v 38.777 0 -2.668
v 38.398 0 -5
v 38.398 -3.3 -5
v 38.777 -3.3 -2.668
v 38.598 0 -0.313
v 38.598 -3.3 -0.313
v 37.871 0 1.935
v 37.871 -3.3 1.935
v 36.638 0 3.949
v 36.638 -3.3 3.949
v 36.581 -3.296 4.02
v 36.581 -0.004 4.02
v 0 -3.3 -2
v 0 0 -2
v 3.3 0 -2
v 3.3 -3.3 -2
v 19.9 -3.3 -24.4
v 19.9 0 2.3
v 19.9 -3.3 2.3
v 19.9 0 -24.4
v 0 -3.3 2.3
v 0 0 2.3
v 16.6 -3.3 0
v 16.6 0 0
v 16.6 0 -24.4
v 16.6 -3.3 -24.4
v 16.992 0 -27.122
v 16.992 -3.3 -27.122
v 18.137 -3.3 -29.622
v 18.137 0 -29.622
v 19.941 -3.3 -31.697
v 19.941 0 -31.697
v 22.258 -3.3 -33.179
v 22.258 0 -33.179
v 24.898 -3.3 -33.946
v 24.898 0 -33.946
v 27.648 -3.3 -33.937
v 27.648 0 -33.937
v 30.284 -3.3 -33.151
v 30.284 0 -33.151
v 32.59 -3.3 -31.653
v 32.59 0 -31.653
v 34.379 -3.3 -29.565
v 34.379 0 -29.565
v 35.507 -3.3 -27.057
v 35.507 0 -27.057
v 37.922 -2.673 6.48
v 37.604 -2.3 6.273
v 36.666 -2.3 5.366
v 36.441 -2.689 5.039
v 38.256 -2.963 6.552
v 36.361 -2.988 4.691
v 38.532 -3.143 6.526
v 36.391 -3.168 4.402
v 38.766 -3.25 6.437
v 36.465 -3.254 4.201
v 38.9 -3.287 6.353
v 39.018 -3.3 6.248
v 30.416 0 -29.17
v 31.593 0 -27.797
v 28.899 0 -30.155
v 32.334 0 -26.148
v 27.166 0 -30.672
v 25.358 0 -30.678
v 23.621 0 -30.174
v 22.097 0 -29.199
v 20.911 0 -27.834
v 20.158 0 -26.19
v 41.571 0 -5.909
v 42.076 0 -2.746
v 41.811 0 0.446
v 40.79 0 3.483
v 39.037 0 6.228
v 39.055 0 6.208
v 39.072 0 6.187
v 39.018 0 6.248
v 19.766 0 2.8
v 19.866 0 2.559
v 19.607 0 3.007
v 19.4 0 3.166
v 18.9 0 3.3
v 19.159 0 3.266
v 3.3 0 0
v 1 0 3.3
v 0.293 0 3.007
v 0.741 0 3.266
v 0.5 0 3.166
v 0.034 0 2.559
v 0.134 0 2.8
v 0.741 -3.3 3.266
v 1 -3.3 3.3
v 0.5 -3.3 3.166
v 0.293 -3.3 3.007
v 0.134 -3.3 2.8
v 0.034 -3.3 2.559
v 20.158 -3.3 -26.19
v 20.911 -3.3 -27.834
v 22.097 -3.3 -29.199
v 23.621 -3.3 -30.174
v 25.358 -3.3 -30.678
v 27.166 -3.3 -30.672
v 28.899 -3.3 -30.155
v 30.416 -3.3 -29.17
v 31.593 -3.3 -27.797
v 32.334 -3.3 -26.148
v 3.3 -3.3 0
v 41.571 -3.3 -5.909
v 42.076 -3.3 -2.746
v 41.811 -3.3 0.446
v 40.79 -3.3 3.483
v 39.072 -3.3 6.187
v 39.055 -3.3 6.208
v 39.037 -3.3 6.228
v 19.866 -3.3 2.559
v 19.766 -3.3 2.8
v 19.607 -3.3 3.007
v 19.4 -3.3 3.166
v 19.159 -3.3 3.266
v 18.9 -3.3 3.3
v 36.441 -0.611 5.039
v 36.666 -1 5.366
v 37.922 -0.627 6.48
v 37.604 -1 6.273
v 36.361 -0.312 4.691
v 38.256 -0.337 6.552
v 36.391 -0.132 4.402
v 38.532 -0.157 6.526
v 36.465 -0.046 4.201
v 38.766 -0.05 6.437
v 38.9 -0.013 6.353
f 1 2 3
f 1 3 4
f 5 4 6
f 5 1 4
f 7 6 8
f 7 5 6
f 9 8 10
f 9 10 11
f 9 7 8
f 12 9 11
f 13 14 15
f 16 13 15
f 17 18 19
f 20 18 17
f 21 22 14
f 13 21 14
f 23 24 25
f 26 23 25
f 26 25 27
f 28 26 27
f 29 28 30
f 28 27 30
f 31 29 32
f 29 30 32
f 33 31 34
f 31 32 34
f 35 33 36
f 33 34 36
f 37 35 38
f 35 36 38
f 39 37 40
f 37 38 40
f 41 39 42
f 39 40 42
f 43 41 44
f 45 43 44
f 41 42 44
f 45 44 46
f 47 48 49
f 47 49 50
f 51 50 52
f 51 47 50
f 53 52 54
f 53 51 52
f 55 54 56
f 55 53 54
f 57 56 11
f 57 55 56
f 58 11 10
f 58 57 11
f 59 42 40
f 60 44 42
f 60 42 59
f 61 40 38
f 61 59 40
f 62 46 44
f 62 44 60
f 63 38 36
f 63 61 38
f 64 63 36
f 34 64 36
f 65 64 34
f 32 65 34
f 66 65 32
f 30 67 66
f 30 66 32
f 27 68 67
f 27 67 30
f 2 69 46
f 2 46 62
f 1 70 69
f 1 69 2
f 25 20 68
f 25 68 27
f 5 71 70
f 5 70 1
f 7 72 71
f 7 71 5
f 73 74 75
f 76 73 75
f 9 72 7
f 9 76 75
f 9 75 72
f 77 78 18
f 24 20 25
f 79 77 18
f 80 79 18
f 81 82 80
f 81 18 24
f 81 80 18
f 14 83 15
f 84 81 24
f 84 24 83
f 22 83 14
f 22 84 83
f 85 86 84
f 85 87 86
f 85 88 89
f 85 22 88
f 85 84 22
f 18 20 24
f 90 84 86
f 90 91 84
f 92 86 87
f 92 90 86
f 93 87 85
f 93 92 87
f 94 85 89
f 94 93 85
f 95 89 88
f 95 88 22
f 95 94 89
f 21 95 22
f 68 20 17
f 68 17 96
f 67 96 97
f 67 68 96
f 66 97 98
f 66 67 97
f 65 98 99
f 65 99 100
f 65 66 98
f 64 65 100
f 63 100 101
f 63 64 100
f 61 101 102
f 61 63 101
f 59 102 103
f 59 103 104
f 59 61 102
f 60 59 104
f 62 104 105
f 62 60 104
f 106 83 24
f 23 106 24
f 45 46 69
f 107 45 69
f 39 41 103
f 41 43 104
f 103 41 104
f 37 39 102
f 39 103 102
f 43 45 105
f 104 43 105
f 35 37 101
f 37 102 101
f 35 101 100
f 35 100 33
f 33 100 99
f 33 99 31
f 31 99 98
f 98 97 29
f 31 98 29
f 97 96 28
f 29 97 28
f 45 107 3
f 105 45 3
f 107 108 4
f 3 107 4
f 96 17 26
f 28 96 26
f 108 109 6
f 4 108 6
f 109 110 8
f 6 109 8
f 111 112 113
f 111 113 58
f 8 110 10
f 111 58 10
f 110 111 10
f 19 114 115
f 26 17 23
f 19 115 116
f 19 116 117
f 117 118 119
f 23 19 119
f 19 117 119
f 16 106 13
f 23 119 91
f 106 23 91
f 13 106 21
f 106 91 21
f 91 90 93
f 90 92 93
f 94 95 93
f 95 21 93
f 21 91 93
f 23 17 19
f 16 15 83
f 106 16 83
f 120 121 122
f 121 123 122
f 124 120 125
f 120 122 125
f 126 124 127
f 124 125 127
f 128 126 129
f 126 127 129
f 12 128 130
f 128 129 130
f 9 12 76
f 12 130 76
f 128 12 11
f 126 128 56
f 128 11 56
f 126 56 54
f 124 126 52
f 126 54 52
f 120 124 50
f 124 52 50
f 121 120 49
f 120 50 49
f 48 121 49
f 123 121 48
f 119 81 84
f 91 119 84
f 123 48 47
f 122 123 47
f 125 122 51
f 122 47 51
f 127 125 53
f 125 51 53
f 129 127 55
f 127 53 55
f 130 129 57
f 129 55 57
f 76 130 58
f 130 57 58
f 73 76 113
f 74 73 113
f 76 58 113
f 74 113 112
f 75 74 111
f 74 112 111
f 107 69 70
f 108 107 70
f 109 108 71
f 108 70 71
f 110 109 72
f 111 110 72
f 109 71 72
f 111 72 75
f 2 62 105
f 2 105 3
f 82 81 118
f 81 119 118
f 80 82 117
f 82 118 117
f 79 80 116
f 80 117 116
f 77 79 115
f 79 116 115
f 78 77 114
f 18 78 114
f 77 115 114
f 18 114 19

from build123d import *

# Parameters (mm, degrees)
PAD_DEPTH = 3.3
FILLET_R  = 1


with BuildPart() as part:
    # Sketch002 → Pad (new body)
    with BuildSketch(Plane.XZ):
        with BuildLine():
            Line((16.6, 3.3), (19.9, 3.3))
            Line((19.9, 3.3), (19.9, -24.4))
            ThreePointArc((19.9, -24.4), (25.357643, -30.6783), (32.334399, -26.147541))
            Line((32.334399, -26.147541), (38.398421, -4.999784))
            ThreePointArc((38.398421, -4.999784), (38.488761, 0.175809), (35.979202, 4.703174))
            Line((35.979202, 4.703174), (38.353023, 6.995546))
            ThreePointArc((41.570585, -5.909387), (41.690737, 0.974151), (38.353023, 6.995546))
            Line((35.506563, -27.057144), (41.570585, -5.909387))
            ThreePointArc((16.6, -24.4), (24.898371, -33.946184), (35.506563, -27.057144))
            Line((16.6, 0), (16.6, -24.4))
            Line((3.3, 0), (16.6, 0))
            Line((3.3, -2), (3.3, 0))
            Line((0, -2), (3.3, -2))
            Line((0, 0), (0, -2))
            Line((0, 3.3), (0, 0))
            Line((16.6, 3.3), (0, 3.3))
        make_face()
    extrude(amount=PAD_DEPTH)

    # Fillet
    fillet_edges = [part.edges().sort_by_distance(p)[0] for p in [
        (0, -1.65, 3.3),
        (19.9, -1.65, 3.3),
        (35.979202, -1.65, 4.703174),
        (38.353023, -1.65, 6.995546),
        (37.166113, 0, 5.84936),
        (37.166113, -3.3, 5.84936),
    ]]
    fillet(fillet_edges, radius=FILLET_R)


solid = part.part
